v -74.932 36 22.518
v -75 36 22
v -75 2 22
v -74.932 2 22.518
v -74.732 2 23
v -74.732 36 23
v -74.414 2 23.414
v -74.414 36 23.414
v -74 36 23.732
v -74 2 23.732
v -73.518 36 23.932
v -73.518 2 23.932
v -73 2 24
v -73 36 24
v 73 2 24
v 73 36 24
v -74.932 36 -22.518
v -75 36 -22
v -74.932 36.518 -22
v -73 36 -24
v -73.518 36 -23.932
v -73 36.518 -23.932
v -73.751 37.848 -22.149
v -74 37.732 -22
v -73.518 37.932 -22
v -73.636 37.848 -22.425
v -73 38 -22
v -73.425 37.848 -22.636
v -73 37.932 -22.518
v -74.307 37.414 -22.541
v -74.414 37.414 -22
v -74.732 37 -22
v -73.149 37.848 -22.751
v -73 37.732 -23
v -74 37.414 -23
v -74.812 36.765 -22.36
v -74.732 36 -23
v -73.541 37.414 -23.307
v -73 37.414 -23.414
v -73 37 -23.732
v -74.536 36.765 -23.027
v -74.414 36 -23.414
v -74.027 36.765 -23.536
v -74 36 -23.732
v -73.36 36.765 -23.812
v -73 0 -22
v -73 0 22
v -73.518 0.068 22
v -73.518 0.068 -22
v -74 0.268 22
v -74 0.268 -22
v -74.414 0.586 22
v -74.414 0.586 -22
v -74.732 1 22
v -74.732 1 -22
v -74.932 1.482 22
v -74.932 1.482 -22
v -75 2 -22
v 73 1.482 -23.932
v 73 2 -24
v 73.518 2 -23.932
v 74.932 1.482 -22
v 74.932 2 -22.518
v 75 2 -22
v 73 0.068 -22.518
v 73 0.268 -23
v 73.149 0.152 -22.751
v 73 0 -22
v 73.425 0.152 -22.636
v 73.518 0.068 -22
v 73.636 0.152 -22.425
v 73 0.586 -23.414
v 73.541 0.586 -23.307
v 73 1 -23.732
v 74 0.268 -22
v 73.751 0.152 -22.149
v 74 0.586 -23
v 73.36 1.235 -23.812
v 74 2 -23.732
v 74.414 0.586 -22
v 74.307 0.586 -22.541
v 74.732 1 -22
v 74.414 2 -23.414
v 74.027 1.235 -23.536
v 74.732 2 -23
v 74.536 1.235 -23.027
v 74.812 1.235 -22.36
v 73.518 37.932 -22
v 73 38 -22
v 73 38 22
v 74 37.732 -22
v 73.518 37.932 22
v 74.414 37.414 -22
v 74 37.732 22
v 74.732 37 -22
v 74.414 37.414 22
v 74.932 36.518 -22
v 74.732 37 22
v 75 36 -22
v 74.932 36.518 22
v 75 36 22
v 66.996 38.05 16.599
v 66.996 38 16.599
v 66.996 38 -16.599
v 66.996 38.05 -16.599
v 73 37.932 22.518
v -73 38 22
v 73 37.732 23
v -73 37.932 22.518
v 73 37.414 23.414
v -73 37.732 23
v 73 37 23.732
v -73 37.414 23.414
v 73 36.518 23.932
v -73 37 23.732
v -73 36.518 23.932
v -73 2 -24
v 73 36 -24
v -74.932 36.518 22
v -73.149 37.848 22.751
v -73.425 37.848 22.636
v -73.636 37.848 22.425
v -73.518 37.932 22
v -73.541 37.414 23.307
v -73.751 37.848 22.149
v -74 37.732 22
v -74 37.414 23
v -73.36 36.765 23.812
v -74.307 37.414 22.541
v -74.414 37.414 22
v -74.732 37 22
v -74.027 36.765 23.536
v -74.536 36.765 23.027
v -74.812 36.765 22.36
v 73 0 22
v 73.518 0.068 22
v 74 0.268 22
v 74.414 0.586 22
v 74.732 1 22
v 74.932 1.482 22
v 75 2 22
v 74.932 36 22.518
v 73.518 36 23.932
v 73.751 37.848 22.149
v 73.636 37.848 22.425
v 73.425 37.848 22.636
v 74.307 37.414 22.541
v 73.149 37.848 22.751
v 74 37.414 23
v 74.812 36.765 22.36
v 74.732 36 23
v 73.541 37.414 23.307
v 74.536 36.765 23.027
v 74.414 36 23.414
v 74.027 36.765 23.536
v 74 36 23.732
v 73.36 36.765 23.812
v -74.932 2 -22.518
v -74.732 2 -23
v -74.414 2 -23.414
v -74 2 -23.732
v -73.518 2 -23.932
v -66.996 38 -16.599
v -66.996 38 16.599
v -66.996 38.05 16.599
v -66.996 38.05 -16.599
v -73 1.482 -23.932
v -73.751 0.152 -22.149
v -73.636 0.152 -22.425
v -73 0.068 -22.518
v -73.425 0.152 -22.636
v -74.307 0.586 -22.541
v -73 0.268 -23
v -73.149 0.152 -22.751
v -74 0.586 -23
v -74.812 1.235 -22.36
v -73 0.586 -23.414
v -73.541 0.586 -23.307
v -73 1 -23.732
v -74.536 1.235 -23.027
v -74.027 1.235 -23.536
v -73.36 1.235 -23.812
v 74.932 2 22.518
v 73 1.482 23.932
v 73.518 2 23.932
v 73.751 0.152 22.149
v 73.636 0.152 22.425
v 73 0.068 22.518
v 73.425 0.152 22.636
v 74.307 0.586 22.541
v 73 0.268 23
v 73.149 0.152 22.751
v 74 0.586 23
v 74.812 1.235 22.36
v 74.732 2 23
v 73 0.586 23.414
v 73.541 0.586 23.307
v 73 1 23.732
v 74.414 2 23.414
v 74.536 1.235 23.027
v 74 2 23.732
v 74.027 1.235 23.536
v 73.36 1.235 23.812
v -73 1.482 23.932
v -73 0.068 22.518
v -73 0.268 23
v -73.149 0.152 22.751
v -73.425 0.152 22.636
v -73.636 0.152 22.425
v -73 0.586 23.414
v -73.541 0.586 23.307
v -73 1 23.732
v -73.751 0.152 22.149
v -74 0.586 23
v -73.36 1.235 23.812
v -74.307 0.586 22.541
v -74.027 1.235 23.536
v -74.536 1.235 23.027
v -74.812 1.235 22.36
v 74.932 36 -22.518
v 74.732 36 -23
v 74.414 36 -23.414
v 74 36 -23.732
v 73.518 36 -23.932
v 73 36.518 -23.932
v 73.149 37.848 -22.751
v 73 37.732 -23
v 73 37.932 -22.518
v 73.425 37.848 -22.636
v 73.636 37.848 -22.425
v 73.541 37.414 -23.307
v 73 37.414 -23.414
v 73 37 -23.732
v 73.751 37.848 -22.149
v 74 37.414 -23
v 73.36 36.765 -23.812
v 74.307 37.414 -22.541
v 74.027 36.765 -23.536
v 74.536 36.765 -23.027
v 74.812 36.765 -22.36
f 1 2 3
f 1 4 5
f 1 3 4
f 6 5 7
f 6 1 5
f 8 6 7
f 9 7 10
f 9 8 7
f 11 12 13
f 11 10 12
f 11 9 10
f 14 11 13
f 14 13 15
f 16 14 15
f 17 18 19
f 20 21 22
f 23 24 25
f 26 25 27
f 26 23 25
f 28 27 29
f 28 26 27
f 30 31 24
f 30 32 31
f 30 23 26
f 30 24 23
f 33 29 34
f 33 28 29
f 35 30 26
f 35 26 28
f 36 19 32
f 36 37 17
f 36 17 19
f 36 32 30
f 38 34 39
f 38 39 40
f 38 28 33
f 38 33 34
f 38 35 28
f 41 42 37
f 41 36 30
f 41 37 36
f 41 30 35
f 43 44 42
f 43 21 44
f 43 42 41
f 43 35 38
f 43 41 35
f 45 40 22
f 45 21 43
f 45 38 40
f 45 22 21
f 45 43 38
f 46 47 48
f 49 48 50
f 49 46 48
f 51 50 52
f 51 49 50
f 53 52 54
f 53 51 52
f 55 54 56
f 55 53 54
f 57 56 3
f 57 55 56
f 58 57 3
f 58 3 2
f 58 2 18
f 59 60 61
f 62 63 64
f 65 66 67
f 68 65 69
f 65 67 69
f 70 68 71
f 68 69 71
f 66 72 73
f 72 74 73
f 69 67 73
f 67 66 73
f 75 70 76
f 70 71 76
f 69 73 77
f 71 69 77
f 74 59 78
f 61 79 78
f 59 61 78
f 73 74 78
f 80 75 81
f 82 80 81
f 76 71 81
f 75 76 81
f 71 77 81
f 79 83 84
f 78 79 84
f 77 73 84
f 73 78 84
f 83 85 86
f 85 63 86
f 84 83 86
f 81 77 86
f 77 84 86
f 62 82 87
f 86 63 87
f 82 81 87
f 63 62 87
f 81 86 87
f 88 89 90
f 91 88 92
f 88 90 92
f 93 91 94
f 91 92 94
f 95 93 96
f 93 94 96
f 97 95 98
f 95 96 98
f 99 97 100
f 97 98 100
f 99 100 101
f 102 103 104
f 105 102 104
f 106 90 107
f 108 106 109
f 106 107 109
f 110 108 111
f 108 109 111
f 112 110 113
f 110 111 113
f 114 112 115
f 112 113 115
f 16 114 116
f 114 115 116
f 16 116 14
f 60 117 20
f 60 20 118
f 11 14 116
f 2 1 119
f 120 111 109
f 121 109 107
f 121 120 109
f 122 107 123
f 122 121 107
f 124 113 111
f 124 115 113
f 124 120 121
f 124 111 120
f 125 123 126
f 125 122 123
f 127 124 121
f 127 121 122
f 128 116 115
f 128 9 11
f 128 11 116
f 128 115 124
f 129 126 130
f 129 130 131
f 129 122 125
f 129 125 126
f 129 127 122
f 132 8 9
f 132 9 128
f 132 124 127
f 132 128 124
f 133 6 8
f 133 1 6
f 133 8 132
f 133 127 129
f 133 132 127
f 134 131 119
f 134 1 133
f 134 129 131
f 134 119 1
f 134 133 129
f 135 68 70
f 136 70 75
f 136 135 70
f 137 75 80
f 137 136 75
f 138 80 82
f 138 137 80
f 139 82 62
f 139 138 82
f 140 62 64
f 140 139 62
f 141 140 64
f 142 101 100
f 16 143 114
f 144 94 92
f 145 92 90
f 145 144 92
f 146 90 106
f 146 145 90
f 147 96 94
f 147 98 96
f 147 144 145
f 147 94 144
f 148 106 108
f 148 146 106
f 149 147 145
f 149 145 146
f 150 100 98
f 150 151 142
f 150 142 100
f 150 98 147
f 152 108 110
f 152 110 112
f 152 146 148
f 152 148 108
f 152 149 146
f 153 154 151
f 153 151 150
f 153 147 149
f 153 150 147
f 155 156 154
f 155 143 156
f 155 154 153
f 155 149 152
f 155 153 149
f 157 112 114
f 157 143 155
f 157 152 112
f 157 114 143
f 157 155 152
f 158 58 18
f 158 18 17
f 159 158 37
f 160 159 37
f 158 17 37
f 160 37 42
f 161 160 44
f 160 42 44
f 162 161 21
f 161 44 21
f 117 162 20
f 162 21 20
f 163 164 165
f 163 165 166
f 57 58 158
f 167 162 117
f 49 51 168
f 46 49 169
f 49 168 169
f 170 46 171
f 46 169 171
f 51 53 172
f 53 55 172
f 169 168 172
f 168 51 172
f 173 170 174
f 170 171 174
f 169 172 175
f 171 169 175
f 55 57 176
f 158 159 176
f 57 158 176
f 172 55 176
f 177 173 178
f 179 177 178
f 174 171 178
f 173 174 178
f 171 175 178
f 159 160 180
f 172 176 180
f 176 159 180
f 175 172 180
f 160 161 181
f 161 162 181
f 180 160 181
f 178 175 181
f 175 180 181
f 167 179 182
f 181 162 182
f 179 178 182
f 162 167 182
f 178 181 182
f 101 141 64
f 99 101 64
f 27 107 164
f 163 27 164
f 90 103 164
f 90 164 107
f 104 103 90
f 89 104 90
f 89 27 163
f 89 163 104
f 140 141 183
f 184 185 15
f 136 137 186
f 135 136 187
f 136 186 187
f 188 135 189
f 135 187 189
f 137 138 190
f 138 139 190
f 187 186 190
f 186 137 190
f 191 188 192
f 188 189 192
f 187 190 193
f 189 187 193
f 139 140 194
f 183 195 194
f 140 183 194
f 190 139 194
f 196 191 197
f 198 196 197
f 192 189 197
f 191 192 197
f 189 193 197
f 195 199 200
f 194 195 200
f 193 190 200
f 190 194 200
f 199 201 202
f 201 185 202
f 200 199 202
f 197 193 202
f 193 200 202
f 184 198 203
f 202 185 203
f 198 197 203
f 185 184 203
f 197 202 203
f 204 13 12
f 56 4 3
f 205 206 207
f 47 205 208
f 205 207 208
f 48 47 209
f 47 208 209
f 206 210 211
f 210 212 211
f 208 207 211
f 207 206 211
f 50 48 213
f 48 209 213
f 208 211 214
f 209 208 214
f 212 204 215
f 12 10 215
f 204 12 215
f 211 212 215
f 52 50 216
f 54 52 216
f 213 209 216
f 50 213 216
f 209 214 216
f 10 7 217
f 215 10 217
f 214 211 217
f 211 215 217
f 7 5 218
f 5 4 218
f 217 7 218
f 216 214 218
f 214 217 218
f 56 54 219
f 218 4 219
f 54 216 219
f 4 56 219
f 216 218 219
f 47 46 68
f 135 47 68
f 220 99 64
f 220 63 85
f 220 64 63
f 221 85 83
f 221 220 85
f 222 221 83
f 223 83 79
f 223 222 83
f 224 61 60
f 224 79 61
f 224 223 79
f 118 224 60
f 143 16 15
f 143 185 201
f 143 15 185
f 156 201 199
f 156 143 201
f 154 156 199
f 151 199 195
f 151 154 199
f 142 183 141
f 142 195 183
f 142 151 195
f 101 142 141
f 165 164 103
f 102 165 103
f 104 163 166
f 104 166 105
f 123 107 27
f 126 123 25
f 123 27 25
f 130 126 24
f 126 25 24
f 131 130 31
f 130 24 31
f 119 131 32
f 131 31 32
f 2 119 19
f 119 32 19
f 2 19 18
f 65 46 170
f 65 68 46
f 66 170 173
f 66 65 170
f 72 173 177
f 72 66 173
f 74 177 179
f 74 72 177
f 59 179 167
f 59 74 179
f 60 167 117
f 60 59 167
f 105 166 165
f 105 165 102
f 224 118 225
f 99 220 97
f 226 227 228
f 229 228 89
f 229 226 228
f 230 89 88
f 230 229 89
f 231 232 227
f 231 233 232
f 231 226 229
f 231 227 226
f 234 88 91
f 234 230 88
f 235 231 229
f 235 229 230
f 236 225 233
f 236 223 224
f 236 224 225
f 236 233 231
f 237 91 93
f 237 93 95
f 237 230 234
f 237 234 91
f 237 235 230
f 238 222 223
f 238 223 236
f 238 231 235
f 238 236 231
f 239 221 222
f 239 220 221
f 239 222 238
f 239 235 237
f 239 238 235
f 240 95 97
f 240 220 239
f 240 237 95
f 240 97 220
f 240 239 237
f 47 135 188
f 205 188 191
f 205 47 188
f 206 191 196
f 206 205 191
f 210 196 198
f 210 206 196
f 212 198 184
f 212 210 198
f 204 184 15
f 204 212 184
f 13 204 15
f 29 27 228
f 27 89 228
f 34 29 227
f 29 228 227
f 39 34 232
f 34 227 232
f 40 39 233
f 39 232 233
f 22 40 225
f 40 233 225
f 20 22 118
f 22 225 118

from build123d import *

# Parameters (mm, degrees)
SKETCH1_W           = 150
SKETCH1_H           = 48
BOSS_EXTRUDE1_DEPTH = 38
FILLET1_R           = 2
FILLET2_R           = 2
SKETCH3_W           = 133.991649932
SKETCH3_H           = 33.197482774
BOSS_EXTRUDE2_DEPTH = 0.05


with BuildPart() as part:
    # Sketch1 → Boss-Extrude1 (new body)
    with BuildSketch(Plane(origin=(0, 0, 0), x_dir=(1, 0, 0), z_dir=(0, 1, 0))):
        Rectangle(SKETCH1_W, SKETCH1_H)
    extrude(amount=BOSS_EXTRUDE1_DEPTH)

    # Fillet1
    fillet1_edges = [part.edges().sort_by_distance(p)[0] for p in [
        (75, 19, 24),
        (-75, 19, 24),
        (-75, 19, -24),
        (75, 19, -24),
    ]]
    fillet(fillet1_edges, radius=FILLET1_R)

    # Fillet2
    fillet2_edges = [part.edges().sort_by_distance(p)[0] for p in [
        (0, 0, -24),
        (0, 38, -24),
        (75, 0, 0),
        (0, 0, 24),
        (-75, 0, 0),
        (-74.414213562, 0, 23.414213562),
        (-74.414213562, 0, -23.414213562),
        (74.414213562, 0, 23.414213562),
        (74.414213562, 0, -23.414213562),
        (75, 38, 0),
        (-75, 38, 0),
        (0, 38, 24),
        (-74.414213562, 38, 23.414213562),
        (-74.414213562, 38, -23.414213562),
        (74.414213562, 38, 23.414213562),
        (74.414213562, 38, -23.414213562),
    ]]
    fillet(fillet2_edges, radius=FILLET2_R)

    # Sketch3 → Boss-Extrude2 (add)
    with BuildSketch(Plane(origin=(0, 38, 0), x_dir=(1, 0, 0), z_dir=(0, 1, 0))):
        Rectangle(SKETCH3_W, SKETCH3_H)
    extrude(amount=BOSS_EXTRUDE2_DEPTH)


solid = part.part
